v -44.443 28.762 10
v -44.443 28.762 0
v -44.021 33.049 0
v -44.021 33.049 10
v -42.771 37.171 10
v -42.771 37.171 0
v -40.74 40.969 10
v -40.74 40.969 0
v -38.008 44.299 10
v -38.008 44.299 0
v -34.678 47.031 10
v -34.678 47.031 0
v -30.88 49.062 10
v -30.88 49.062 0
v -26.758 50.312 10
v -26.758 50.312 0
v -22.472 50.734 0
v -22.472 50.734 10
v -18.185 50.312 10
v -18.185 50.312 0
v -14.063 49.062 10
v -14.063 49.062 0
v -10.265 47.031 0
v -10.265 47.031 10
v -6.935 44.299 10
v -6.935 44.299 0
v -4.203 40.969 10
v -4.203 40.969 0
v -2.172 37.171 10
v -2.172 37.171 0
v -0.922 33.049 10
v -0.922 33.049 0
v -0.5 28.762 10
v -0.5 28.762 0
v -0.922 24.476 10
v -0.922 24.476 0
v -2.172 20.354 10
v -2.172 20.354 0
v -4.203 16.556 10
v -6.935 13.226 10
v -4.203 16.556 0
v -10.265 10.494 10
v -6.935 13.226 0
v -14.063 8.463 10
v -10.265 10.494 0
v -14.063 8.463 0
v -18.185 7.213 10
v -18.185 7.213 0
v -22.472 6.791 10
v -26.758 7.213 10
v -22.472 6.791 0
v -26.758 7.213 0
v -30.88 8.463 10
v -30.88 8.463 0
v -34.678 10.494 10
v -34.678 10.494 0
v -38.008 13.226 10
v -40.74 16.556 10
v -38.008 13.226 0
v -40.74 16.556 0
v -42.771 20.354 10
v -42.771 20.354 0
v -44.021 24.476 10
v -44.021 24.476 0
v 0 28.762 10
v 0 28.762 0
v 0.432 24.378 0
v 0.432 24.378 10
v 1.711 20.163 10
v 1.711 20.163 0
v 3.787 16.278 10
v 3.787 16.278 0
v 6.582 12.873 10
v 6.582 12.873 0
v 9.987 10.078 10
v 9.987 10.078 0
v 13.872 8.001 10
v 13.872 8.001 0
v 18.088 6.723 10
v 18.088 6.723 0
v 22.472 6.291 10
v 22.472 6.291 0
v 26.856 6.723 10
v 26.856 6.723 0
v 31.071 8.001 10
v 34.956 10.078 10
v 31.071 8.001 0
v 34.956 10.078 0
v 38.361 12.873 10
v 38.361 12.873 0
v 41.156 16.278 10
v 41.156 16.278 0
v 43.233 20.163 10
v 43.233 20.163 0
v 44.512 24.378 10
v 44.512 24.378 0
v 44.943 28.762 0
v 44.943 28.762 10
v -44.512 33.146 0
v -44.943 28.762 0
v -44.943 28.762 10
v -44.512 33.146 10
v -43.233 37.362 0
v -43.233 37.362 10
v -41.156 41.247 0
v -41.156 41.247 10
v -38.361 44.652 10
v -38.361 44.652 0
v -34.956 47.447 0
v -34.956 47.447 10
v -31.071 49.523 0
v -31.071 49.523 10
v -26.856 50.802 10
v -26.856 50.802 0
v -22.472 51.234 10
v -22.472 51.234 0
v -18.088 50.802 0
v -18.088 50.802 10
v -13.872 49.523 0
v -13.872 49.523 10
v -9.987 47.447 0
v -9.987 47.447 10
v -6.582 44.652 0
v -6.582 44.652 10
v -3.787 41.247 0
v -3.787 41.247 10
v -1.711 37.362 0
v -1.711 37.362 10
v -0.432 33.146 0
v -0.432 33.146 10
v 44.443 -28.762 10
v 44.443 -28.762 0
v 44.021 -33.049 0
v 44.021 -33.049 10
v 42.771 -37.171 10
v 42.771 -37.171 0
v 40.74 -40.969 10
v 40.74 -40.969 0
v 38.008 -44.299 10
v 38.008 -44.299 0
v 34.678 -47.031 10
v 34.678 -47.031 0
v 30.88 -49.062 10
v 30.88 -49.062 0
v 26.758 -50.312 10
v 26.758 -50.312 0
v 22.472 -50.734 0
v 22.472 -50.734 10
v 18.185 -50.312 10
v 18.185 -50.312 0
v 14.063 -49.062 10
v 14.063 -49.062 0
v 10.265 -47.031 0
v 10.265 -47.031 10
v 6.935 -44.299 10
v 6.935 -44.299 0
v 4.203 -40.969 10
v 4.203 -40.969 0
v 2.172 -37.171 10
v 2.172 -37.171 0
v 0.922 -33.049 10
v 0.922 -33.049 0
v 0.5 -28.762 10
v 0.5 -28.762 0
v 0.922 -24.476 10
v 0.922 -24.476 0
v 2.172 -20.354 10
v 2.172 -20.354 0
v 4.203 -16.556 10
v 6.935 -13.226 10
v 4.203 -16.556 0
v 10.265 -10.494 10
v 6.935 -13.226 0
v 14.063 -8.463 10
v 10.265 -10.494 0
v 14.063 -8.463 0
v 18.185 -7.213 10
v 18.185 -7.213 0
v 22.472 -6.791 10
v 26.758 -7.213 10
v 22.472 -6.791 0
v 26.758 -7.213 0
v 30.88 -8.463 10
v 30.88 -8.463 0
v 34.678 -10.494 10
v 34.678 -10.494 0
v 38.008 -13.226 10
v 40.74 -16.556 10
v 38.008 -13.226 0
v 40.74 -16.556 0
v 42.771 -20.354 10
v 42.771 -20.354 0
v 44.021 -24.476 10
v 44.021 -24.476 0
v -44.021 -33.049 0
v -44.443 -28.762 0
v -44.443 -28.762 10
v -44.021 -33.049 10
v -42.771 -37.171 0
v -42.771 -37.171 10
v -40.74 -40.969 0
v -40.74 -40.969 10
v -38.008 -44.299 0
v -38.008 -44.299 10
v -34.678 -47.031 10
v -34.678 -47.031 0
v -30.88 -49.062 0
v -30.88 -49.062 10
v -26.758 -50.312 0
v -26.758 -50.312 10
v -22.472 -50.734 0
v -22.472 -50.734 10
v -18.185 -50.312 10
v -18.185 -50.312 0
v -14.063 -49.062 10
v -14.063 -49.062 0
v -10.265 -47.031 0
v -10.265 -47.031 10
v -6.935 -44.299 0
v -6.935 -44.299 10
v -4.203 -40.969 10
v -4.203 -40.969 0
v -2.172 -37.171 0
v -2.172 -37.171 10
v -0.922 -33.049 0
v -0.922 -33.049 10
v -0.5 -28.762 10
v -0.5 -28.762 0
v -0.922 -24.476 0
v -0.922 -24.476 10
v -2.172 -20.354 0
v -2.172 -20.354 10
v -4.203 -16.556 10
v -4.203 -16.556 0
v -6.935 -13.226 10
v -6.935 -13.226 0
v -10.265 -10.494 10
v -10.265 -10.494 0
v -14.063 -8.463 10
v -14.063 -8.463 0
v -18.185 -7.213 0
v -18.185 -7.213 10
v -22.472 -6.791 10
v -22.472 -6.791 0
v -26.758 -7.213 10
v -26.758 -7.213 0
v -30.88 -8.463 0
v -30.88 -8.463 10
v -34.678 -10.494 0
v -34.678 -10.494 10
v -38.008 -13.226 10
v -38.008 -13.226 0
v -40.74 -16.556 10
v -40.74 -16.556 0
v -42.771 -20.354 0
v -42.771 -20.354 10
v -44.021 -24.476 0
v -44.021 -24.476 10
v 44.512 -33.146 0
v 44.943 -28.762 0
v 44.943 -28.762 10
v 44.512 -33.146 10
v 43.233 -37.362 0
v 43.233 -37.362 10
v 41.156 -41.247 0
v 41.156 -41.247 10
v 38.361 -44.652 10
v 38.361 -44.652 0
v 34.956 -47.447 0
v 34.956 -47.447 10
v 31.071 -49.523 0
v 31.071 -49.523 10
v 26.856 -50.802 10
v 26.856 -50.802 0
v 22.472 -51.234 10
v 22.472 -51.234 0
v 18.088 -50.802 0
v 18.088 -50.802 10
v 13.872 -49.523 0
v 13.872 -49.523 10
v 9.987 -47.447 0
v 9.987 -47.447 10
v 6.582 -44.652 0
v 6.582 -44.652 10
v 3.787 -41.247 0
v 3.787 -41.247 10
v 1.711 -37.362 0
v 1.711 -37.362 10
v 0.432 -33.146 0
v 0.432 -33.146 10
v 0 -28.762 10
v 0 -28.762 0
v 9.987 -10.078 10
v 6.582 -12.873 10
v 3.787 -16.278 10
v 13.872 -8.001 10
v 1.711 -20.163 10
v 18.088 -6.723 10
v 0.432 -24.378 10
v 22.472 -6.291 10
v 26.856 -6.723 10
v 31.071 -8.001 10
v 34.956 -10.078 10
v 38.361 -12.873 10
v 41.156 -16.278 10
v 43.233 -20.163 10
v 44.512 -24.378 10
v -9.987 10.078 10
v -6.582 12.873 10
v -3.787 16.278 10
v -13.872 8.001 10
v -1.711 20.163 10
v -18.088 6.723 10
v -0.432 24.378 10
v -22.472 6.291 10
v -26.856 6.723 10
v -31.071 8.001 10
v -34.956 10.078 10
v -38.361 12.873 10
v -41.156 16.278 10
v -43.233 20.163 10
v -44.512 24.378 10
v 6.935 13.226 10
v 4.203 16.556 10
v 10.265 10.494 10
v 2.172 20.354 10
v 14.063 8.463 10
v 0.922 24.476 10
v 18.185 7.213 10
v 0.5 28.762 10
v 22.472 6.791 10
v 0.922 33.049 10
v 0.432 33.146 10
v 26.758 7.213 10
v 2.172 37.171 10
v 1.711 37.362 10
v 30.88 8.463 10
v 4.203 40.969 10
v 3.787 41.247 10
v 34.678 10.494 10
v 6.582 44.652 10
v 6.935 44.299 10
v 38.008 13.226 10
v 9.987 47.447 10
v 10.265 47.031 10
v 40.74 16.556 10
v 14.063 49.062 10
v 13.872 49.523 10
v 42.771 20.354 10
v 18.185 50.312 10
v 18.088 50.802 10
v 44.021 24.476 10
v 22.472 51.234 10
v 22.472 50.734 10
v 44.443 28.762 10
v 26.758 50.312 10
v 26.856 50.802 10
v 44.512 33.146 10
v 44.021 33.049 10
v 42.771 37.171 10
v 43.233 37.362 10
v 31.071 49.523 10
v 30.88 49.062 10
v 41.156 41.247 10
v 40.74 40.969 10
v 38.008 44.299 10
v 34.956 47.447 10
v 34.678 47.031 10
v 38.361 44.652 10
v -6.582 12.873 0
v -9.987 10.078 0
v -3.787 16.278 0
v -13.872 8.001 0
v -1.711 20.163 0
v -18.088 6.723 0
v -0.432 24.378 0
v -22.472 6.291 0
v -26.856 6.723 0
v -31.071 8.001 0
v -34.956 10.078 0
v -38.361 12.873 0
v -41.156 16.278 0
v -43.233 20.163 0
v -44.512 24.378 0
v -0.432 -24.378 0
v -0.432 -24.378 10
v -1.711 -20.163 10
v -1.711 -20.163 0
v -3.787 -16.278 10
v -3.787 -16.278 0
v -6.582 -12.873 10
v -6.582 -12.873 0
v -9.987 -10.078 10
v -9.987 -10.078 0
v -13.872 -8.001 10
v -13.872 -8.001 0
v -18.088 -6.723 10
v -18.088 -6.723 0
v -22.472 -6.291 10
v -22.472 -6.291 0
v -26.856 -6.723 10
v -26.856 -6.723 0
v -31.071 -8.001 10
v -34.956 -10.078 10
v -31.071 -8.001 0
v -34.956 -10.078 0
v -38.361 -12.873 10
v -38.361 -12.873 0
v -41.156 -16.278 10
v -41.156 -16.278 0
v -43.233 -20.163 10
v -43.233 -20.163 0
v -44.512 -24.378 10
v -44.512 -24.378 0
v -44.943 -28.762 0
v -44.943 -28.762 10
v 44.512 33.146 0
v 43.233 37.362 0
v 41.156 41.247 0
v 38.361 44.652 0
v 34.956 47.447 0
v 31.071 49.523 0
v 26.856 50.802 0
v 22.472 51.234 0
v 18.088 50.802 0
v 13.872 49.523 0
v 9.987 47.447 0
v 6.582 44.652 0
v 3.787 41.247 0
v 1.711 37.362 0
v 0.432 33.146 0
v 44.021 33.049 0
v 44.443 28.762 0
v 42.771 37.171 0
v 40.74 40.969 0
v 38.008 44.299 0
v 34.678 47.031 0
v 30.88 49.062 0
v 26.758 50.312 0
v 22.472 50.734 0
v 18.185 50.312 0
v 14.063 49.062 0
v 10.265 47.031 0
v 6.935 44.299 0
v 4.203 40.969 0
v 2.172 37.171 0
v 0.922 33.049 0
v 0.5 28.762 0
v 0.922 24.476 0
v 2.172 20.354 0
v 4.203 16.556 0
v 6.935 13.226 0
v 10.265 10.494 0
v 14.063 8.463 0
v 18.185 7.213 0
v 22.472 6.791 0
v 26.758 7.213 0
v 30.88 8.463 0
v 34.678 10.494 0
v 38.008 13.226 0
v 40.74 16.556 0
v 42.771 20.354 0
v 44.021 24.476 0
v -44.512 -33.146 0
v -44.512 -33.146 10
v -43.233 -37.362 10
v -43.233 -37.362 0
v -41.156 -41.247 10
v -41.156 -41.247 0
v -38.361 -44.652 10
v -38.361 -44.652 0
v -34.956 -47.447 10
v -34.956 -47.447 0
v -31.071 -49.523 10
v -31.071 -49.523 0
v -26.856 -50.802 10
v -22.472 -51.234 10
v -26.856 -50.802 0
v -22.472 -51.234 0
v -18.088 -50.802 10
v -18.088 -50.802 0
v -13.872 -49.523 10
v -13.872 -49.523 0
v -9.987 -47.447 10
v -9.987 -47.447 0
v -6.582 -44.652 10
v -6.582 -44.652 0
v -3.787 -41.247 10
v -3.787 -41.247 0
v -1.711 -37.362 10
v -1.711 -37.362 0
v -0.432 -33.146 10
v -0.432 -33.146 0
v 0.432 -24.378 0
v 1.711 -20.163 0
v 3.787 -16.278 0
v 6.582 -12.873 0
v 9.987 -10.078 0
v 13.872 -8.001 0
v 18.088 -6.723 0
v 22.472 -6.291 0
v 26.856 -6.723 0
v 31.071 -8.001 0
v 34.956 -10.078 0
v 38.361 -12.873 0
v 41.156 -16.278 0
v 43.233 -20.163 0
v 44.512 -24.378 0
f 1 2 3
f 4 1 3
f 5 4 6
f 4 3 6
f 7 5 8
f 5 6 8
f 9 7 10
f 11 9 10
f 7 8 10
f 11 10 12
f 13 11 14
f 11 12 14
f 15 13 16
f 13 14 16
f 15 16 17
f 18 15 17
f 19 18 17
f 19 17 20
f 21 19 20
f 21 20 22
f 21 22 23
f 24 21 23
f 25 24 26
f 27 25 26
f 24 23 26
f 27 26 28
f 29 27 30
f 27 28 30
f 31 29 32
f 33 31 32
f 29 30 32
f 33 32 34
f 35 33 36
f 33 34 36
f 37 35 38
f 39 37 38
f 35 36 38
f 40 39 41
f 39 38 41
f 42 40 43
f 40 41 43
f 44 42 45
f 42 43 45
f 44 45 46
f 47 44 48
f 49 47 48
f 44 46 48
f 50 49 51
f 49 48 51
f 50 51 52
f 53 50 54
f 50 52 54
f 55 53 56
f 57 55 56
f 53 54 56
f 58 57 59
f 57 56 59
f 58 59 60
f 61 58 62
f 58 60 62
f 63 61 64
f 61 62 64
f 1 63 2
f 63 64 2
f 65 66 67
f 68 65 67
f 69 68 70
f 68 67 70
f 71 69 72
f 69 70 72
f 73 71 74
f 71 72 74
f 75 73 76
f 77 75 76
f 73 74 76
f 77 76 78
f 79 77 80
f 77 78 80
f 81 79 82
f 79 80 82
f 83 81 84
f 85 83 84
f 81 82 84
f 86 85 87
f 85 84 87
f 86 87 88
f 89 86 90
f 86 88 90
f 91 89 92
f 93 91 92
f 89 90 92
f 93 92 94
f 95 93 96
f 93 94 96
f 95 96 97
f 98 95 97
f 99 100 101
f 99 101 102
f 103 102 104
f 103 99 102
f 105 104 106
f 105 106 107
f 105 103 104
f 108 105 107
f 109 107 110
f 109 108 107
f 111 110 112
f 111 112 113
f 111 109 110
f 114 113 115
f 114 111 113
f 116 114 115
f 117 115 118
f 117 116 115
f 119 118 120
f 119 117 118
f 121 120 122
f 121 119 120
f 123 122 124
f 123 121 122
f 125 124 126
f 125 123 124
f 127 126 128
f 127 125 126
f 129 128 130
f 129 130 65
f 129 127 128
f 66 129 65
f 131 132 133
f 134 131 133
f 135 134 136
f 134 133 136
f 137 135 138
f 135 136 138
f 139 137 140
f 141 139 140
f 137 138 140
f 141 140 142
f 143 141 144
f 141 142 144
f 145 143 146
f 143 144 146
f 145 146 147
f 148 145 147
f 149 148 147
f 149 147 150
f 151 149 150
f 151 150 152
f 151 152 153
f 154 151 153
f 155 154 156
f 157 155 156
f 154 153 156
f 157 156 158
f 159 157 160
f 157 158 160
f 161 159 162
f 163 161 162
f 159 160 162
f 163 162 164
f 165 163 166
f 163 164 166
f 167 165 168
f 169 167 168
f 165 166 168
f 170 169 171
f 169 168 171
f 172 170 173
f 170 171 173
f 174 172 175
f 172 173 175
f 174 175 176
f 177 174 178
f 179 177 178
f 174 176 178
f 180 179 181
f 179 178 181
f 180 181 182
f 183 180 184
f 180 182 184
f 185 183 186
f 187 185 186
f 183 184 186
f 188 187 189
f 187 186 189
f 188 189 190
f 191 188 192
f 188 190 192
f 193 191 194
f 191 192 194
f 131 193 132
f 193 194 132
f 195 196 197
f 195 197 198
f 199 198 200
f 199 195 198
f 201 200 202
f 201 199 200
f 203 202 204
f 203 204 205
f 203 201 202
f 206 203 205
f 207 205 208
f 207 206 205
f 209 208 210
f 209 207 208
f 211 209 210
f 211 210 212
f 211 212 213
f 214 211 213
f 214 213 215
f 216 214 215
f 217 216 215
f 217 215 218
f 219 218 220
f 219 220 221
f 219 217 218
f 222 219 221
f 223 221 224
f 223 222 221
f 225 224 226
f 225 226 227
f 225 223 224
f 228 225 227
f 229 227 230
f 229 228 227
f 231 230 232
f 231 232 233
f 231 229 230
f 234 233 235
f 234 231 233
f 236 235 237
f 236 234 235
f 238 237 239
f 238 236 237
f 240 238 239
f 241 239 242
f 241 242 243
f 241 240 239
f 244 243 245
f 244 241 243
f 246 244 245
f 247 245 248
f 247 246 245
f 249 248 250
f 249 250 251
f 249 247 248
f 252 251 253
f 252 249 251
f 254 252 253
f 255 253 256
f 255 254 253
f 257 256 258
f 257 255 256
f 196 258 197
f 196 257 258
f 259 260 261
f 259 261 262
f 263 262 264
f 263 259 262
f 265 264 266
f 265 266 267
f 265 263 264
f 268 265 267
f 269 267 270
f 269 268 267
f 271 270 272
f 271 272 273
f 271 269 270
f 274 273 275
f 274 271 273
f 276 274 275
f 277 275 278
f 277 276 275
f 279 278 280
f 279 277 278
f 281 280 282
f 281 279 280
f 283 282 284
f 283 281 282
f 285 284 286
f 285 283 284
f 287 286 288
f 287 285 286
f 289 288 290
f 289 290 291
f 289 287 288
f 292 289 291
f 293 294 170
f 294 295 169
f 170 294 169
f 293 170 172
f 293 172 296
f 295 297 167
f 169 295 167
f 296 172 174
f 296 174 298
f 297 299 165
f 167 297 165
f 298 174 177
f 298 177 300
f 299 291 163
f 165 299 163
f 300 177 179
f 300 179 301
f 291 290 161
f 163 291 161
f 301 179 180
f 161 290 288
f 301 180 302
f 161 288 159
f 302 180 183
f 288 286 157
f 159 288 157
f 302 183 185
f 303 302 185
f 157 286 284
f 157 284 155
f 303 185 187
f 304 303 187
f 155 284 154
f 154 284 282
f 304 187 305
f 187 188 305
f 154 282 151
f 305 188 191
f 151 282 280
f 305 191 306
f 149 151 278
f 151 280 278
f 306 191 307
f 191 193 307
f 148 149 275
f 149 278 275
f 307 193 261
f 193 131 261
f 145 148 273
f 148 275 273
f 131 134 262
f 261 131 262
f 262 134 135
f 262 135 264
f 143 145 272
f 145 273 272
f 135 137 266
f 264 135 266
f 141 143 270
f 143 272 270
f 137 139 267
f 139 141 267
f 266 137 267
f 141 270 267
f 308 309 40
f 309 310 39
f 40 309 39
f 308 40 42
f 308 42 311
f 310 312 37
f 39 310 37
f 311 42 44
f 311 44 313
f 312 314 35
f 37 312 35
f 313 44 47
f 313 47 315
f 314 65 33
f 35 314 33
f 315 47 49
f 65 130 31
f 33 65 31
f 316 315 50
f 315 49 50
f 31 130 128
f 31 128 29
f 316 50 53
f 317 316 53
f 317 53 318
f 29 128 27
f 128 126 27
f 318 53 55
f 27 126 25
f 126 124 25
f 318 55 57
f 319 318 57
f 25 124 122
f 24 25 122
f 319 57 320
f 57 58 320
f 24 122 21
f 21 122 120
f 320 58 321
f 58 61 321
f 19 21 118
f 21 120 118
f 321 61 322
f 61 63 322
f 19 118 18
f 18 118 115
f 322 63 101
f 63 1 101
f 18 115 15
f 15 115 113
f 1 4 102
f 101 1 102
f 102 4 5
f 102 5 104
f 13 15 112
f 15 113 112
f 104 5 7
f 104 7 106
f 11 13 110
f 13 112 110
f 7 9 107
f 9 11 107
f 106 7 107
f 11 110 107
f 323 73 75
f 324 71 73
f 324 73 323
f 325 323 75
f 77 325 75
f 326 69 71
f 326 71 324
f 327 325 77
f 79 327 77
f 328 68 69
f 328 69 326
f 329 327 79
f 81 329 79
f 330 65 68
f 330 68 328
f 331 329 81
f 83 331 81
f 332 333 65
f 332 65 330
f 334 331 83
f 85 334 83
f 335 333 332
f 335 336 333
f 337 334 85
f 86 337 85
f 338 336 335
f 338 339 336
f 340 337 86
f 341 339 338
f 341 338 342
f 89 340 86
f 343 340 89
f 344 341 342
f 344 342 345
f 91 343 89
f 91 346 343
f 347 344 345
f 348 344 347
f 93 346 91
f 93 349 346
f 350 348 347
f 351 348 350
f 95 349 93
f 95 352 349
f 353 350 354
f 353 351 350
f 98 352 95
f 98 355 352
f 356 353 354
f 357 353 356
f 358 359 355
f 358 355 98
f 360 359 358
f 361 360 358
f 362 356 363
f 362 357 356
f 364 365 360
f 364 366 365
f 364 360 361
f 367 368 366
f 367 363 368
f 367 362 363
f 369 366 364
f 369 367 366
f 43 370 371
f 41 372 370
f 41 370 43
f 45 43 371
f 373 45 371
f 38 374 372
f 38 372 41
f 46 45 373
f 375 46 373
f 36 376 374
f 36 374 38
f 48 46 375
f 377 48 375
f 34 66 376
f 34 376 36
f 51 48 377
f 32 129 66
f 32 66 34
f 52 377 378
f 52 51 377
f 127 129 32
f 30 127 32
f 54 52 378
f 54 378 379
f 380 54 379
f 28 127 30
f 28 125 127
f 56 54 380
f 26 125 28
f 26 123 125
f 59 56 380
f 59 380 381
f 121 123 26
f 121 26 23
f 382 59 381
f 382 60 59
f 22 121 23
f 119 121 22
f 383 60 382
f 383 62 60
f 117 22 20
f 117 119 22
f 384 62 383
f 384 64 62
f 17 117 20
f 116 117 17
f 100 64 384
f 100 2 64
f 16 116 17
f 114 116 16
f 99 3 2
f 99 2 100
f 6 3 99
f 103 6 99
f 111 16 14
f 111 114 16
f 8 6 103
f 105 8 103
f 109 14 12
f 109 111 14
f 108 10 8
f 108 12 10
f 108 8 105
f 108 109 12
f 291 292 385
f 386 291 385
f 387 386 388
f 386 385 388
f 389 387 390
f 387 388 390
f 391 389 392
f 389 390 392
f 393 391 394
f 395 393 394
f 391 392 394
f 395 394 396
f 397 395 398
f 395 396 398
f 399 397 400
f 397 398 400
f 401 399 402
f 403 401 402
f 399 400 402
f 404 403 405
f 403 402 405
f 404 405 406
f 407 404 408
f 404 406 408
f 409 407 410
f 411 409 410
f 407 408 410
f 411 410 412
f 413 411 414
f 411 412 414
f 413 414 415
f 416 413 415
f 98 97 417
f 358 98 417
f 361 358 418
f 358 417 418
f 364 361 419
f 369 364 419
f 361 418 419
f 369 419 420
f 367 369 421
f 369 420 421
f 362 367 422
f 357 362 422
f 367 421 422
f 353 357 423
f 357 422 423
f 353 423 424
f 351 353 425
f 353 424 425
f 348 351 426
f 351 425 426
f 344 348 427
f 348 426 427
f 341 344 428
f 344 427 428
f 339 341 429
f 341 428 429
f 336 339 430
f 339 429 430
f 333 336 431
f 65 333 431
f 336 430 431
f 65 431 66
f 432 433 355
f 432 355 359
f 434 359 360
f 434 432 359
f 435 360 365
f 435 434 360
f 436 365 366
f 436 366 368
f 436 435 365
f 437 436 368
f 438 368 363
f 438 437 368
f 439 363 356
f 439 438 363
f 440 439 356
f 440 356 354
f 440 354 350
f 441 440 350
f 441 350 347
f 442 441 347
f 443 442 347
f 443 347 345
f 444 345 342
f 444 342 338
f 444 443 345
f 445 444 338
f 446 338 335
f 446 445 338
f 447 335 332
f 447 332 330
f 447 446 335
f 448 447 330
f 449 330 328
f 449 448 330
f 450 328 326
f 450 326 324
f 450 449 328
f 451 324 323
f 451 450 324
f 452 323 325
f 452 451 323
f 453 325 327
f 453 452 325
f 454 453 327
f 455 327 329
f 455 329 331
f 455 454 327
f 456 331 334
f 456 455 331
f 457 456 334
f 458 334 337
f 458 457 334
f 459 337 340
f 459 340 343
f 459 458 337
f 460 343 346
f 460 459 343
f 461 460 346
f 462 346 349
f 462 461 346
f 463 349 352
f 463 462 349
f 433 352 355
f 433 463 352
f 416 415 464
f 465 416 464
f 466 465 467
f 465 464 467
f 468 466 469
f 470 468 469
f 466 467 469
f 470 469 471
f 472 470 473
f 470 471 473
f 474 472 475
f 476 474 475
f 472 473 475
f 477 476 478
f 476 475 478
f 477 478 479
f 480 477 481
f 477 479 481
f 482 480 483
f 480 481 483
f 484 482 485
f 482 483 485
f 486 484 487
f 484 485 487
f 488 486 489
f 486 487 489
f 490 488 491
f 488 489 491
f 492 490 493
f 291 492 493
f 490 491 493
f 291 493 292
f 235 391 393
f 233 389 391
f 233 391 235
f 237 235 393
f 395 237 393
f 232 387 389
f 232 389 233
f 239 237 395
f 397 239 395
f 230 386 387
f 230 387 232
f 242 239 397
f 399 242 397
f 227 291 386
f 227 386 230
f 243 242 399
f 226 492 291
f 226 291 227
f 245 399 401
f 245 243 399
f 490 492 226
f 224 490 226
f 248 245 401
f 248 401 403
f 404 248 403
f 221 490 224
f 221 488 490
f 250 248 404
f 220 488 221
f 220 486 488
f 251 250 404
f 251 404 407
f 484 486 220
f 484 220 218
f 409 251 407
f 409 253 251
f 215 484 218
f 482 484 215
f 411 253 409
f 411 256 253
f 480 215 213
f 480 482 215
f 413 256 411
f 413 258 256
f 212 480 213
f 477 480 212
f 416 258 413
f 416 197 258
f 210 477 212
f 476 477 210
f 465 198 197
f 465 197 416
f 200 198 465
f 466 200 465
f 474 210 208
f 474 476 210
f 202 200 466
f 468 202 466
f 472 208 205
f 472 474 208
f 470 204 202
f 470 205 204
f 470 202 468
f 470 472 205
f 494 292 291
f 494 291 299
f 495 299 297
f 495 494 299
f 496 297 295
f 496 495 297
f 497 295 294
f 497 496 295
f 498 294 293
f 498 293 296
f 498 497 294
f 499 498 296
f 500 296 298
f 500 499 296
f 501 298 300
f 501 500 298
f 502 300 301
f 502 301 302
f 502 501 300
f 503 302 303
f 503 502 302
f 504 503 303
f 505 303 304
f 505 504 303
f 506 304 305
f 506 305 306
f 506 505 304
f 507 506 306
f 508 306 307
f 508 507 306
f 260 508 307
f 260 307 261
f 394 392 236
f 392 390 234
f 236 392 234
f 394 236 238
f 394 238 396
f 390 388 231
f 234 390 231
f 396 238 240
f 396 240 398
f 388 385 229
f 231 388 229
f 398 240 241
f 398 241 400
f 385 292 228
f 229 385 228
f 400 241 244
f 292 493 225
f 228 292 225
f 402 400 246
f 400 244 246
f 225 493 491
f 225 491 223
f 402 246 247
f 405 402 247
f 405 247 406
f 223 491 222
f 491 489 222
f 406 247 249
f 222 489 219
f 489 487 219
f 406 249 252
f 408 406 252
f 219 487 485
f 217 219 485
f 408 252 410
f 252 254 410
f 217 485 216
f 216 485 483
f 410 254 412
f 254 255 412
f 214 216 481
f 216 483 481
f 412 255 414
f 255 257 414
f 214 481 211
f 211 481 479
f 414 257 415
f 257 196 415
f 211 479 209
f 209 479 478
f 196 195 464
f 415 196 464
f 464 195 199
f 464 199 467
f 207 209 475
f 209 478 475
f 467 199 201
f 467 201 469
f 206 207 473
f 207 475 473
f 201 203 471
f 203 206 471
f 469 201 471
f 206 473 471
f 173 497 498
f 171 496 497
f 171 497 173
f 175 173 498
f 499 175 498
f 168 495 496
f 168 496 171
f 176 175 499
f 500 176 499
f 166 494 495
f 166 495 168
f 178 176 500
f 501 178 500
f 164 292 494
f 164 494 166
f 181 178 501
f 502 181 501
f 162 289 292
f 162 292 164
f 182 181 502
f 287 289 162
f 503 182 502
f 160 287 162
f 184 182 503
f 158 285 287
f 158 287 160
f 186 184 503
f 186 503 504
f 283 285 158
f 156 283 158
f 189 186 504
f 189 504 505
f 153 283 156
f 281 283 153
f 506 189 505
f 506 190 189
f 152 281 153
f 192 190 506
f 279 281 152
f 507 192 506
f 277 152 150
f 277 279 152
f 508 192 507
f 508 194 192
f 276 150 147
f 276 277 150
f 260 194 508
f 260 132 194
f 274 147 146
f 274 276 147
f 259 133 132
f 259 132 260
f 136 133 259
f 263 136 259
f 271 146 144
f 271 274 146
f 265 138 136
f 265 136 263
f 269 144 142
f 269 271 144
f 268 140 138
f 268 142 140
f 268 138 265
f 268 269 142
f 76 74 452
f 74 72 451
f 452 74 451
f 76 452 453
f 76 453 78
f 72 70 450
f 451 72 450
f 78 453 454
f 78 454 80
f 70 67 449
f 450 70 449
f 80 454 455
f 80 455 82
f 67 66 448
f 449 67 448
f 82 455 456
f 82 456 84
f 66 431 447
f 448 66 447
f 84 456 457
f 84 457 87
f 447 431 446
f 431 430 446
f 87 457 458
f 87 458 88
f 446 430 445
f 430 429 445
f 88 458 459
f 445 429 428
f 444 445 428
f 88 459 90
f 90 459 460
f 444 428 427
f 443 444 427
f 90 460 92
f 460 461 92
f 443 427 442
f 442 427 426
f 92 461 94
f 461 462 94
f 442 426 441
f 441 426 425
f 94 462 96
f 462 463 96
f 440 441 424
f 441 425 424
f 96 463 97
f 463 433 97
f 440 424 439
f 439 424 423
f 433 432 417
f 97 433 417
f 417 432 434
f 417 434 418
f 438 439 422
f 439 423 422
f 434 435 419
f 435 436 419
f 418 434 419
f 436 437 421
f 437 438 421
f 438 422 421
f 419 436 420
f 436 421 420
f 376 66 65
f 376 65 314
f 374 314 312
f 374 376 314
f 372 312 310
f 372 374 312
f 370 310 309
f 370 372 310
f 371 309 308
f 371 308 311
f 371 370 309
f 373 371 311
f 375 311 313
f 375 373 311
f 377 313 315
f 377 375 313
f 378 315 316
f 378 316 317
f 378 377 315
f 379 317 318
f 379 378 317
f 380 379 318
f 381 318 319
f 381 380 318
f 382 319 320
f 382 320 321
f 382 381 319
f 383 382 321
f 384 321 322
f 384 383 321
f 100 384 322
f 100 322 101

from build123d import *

# Parameters (mm, degrees)
F0_R     = 22.471644
F0_R_2   = 21.971644
F1_DEPTH = 10


with BuildPart() as f1:
    # F0 (on Top) → F1 (new body)
    with BuildSketch(Plane.XY):
        with Locations((22.471644, 28.762393)):
            Circle(F0_R)
        with Locations((22.471644, 28.762393)):
            Circle(F0_R_2, mode=Mode.SUBTRACT)
    extrude(amount=F1_DEPTH)

    # F2: F1 across plane


with BuildPart() as f1_1:
    add(f1.part)
    add(f1.part.mirror(Plane.YZ))


with BuildPart() as f3_1:
    # F3: instance of F1
    add(f1_1.part.mirror(Plane.XZ))


solid = Compound([f1_1.part, f3_1.part])
